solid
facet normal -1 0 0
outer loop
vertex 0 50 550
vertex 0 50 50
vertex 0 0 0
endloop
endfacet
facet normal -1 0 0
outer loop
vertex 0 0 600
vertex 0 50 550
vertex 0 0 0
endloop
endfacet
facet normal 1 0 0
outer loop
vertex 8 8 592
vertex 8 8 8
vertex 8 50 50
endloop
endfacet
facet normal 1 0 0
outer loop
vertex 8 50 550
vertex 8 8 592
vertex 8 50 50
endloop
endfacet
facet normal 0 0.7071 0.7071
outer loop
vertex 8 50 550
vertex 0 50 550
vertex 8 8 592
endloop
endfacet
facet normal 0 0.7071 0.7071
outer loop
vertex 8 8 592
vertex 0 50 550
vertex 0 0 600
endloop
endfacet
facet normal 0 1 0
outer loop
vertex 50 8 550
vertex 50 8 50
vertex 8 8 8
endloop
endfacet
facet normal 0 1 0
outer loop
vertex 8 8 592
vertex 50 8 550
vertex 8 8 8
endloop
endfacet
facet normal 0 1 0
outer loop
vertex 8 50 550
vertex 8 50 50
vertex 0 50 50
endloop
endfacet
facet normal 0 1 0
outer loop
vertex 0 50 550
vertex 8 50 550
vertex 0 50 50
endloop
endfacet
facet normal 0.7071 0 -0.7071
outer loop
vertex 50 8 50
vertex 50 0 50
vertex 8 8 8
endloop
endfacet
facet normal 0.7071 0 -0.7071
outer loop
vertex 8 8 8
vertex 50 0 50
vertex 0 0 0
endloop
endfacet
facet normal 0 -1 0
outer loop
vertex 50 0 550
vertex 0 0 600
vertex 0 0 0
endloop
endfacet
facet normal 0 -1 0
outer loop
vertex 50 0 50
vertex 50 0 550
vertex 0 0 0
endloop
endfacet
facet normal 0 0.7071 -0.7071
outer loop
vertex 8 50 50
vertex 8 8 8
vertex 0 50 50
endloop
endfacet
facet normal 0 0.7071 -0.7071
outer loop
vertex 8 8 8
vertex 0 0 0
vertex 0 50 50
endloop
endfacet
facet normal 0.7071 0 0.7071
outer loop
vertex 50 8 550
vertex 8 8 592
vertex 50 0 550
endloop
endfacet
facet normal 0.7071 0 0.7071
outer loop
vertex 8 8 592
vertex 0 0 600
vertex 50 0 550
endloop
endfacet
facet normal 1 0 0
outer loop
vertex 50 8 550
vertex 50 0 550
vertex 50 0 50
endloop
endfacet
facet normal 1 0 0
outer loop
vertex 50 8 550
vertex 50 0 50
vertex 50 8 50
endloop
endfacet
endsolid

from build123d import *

# Parameters (mm, degrees)
F1_DEPTH = 600
F3_DEPTH = 8
F5_DEPTH = 8
F7_DEPTH = 8
F9_DEPTH = 8


with BuildPart() as f1:
    # F0 (on Top) → F1 (new body)
    with BuildSketch(Plane.XY):
        Polygon((0, 50), (0, 0), (50, 0), (50, 8), (8, 8), (8, 50), align=None)
    extrude(amount=F1_DEPTH)

    # F2 (on face) → F3 (cut, through all)
    with BuildSketch(Plane.XZ):
        Polygon((50, 600), (0, 600), (50, 550), align=None)
    extrude(amount=-F3_DEPTH, mode=Mode.SUBTRACT)

    # F4 (on face) → F5 (cut, through all)
    with BuildSketch(Plane(origin=(0, 0, 0), x_dir=(0, -1, 0), z_dir=(-1, 0, 0))):
        Polygon((-50, 550), (0, 600), (-8, 600), (-50, 600), align=None)
    extrude(amount=-F5_DEPTH, mode=Mode.SUBTRACT)

    # F6 (on face) → F7 (cut, through all)
    with BuildSketch(Plane.XZ):
        Polygon((50, 50), (0, 0), (50, 0), align=None)
    extrude(amount=-F7_DEPTH, mode=Mode.SUBTRACT)

    # F8 (on face) → F9 (cut, through all)
    with BuildSketch(Plane(origin=(0, 0, 0), x_dir=(0, -1, 0), z_dir=(-1, 0, 0))):
        Polygon((-8, 0), (0, 0), (-50, 50), (-50, 0), align=None)
    extrude(amount=-F9_DEPTH, mode=Mode.SUBTRACT)


solid = f1.part
